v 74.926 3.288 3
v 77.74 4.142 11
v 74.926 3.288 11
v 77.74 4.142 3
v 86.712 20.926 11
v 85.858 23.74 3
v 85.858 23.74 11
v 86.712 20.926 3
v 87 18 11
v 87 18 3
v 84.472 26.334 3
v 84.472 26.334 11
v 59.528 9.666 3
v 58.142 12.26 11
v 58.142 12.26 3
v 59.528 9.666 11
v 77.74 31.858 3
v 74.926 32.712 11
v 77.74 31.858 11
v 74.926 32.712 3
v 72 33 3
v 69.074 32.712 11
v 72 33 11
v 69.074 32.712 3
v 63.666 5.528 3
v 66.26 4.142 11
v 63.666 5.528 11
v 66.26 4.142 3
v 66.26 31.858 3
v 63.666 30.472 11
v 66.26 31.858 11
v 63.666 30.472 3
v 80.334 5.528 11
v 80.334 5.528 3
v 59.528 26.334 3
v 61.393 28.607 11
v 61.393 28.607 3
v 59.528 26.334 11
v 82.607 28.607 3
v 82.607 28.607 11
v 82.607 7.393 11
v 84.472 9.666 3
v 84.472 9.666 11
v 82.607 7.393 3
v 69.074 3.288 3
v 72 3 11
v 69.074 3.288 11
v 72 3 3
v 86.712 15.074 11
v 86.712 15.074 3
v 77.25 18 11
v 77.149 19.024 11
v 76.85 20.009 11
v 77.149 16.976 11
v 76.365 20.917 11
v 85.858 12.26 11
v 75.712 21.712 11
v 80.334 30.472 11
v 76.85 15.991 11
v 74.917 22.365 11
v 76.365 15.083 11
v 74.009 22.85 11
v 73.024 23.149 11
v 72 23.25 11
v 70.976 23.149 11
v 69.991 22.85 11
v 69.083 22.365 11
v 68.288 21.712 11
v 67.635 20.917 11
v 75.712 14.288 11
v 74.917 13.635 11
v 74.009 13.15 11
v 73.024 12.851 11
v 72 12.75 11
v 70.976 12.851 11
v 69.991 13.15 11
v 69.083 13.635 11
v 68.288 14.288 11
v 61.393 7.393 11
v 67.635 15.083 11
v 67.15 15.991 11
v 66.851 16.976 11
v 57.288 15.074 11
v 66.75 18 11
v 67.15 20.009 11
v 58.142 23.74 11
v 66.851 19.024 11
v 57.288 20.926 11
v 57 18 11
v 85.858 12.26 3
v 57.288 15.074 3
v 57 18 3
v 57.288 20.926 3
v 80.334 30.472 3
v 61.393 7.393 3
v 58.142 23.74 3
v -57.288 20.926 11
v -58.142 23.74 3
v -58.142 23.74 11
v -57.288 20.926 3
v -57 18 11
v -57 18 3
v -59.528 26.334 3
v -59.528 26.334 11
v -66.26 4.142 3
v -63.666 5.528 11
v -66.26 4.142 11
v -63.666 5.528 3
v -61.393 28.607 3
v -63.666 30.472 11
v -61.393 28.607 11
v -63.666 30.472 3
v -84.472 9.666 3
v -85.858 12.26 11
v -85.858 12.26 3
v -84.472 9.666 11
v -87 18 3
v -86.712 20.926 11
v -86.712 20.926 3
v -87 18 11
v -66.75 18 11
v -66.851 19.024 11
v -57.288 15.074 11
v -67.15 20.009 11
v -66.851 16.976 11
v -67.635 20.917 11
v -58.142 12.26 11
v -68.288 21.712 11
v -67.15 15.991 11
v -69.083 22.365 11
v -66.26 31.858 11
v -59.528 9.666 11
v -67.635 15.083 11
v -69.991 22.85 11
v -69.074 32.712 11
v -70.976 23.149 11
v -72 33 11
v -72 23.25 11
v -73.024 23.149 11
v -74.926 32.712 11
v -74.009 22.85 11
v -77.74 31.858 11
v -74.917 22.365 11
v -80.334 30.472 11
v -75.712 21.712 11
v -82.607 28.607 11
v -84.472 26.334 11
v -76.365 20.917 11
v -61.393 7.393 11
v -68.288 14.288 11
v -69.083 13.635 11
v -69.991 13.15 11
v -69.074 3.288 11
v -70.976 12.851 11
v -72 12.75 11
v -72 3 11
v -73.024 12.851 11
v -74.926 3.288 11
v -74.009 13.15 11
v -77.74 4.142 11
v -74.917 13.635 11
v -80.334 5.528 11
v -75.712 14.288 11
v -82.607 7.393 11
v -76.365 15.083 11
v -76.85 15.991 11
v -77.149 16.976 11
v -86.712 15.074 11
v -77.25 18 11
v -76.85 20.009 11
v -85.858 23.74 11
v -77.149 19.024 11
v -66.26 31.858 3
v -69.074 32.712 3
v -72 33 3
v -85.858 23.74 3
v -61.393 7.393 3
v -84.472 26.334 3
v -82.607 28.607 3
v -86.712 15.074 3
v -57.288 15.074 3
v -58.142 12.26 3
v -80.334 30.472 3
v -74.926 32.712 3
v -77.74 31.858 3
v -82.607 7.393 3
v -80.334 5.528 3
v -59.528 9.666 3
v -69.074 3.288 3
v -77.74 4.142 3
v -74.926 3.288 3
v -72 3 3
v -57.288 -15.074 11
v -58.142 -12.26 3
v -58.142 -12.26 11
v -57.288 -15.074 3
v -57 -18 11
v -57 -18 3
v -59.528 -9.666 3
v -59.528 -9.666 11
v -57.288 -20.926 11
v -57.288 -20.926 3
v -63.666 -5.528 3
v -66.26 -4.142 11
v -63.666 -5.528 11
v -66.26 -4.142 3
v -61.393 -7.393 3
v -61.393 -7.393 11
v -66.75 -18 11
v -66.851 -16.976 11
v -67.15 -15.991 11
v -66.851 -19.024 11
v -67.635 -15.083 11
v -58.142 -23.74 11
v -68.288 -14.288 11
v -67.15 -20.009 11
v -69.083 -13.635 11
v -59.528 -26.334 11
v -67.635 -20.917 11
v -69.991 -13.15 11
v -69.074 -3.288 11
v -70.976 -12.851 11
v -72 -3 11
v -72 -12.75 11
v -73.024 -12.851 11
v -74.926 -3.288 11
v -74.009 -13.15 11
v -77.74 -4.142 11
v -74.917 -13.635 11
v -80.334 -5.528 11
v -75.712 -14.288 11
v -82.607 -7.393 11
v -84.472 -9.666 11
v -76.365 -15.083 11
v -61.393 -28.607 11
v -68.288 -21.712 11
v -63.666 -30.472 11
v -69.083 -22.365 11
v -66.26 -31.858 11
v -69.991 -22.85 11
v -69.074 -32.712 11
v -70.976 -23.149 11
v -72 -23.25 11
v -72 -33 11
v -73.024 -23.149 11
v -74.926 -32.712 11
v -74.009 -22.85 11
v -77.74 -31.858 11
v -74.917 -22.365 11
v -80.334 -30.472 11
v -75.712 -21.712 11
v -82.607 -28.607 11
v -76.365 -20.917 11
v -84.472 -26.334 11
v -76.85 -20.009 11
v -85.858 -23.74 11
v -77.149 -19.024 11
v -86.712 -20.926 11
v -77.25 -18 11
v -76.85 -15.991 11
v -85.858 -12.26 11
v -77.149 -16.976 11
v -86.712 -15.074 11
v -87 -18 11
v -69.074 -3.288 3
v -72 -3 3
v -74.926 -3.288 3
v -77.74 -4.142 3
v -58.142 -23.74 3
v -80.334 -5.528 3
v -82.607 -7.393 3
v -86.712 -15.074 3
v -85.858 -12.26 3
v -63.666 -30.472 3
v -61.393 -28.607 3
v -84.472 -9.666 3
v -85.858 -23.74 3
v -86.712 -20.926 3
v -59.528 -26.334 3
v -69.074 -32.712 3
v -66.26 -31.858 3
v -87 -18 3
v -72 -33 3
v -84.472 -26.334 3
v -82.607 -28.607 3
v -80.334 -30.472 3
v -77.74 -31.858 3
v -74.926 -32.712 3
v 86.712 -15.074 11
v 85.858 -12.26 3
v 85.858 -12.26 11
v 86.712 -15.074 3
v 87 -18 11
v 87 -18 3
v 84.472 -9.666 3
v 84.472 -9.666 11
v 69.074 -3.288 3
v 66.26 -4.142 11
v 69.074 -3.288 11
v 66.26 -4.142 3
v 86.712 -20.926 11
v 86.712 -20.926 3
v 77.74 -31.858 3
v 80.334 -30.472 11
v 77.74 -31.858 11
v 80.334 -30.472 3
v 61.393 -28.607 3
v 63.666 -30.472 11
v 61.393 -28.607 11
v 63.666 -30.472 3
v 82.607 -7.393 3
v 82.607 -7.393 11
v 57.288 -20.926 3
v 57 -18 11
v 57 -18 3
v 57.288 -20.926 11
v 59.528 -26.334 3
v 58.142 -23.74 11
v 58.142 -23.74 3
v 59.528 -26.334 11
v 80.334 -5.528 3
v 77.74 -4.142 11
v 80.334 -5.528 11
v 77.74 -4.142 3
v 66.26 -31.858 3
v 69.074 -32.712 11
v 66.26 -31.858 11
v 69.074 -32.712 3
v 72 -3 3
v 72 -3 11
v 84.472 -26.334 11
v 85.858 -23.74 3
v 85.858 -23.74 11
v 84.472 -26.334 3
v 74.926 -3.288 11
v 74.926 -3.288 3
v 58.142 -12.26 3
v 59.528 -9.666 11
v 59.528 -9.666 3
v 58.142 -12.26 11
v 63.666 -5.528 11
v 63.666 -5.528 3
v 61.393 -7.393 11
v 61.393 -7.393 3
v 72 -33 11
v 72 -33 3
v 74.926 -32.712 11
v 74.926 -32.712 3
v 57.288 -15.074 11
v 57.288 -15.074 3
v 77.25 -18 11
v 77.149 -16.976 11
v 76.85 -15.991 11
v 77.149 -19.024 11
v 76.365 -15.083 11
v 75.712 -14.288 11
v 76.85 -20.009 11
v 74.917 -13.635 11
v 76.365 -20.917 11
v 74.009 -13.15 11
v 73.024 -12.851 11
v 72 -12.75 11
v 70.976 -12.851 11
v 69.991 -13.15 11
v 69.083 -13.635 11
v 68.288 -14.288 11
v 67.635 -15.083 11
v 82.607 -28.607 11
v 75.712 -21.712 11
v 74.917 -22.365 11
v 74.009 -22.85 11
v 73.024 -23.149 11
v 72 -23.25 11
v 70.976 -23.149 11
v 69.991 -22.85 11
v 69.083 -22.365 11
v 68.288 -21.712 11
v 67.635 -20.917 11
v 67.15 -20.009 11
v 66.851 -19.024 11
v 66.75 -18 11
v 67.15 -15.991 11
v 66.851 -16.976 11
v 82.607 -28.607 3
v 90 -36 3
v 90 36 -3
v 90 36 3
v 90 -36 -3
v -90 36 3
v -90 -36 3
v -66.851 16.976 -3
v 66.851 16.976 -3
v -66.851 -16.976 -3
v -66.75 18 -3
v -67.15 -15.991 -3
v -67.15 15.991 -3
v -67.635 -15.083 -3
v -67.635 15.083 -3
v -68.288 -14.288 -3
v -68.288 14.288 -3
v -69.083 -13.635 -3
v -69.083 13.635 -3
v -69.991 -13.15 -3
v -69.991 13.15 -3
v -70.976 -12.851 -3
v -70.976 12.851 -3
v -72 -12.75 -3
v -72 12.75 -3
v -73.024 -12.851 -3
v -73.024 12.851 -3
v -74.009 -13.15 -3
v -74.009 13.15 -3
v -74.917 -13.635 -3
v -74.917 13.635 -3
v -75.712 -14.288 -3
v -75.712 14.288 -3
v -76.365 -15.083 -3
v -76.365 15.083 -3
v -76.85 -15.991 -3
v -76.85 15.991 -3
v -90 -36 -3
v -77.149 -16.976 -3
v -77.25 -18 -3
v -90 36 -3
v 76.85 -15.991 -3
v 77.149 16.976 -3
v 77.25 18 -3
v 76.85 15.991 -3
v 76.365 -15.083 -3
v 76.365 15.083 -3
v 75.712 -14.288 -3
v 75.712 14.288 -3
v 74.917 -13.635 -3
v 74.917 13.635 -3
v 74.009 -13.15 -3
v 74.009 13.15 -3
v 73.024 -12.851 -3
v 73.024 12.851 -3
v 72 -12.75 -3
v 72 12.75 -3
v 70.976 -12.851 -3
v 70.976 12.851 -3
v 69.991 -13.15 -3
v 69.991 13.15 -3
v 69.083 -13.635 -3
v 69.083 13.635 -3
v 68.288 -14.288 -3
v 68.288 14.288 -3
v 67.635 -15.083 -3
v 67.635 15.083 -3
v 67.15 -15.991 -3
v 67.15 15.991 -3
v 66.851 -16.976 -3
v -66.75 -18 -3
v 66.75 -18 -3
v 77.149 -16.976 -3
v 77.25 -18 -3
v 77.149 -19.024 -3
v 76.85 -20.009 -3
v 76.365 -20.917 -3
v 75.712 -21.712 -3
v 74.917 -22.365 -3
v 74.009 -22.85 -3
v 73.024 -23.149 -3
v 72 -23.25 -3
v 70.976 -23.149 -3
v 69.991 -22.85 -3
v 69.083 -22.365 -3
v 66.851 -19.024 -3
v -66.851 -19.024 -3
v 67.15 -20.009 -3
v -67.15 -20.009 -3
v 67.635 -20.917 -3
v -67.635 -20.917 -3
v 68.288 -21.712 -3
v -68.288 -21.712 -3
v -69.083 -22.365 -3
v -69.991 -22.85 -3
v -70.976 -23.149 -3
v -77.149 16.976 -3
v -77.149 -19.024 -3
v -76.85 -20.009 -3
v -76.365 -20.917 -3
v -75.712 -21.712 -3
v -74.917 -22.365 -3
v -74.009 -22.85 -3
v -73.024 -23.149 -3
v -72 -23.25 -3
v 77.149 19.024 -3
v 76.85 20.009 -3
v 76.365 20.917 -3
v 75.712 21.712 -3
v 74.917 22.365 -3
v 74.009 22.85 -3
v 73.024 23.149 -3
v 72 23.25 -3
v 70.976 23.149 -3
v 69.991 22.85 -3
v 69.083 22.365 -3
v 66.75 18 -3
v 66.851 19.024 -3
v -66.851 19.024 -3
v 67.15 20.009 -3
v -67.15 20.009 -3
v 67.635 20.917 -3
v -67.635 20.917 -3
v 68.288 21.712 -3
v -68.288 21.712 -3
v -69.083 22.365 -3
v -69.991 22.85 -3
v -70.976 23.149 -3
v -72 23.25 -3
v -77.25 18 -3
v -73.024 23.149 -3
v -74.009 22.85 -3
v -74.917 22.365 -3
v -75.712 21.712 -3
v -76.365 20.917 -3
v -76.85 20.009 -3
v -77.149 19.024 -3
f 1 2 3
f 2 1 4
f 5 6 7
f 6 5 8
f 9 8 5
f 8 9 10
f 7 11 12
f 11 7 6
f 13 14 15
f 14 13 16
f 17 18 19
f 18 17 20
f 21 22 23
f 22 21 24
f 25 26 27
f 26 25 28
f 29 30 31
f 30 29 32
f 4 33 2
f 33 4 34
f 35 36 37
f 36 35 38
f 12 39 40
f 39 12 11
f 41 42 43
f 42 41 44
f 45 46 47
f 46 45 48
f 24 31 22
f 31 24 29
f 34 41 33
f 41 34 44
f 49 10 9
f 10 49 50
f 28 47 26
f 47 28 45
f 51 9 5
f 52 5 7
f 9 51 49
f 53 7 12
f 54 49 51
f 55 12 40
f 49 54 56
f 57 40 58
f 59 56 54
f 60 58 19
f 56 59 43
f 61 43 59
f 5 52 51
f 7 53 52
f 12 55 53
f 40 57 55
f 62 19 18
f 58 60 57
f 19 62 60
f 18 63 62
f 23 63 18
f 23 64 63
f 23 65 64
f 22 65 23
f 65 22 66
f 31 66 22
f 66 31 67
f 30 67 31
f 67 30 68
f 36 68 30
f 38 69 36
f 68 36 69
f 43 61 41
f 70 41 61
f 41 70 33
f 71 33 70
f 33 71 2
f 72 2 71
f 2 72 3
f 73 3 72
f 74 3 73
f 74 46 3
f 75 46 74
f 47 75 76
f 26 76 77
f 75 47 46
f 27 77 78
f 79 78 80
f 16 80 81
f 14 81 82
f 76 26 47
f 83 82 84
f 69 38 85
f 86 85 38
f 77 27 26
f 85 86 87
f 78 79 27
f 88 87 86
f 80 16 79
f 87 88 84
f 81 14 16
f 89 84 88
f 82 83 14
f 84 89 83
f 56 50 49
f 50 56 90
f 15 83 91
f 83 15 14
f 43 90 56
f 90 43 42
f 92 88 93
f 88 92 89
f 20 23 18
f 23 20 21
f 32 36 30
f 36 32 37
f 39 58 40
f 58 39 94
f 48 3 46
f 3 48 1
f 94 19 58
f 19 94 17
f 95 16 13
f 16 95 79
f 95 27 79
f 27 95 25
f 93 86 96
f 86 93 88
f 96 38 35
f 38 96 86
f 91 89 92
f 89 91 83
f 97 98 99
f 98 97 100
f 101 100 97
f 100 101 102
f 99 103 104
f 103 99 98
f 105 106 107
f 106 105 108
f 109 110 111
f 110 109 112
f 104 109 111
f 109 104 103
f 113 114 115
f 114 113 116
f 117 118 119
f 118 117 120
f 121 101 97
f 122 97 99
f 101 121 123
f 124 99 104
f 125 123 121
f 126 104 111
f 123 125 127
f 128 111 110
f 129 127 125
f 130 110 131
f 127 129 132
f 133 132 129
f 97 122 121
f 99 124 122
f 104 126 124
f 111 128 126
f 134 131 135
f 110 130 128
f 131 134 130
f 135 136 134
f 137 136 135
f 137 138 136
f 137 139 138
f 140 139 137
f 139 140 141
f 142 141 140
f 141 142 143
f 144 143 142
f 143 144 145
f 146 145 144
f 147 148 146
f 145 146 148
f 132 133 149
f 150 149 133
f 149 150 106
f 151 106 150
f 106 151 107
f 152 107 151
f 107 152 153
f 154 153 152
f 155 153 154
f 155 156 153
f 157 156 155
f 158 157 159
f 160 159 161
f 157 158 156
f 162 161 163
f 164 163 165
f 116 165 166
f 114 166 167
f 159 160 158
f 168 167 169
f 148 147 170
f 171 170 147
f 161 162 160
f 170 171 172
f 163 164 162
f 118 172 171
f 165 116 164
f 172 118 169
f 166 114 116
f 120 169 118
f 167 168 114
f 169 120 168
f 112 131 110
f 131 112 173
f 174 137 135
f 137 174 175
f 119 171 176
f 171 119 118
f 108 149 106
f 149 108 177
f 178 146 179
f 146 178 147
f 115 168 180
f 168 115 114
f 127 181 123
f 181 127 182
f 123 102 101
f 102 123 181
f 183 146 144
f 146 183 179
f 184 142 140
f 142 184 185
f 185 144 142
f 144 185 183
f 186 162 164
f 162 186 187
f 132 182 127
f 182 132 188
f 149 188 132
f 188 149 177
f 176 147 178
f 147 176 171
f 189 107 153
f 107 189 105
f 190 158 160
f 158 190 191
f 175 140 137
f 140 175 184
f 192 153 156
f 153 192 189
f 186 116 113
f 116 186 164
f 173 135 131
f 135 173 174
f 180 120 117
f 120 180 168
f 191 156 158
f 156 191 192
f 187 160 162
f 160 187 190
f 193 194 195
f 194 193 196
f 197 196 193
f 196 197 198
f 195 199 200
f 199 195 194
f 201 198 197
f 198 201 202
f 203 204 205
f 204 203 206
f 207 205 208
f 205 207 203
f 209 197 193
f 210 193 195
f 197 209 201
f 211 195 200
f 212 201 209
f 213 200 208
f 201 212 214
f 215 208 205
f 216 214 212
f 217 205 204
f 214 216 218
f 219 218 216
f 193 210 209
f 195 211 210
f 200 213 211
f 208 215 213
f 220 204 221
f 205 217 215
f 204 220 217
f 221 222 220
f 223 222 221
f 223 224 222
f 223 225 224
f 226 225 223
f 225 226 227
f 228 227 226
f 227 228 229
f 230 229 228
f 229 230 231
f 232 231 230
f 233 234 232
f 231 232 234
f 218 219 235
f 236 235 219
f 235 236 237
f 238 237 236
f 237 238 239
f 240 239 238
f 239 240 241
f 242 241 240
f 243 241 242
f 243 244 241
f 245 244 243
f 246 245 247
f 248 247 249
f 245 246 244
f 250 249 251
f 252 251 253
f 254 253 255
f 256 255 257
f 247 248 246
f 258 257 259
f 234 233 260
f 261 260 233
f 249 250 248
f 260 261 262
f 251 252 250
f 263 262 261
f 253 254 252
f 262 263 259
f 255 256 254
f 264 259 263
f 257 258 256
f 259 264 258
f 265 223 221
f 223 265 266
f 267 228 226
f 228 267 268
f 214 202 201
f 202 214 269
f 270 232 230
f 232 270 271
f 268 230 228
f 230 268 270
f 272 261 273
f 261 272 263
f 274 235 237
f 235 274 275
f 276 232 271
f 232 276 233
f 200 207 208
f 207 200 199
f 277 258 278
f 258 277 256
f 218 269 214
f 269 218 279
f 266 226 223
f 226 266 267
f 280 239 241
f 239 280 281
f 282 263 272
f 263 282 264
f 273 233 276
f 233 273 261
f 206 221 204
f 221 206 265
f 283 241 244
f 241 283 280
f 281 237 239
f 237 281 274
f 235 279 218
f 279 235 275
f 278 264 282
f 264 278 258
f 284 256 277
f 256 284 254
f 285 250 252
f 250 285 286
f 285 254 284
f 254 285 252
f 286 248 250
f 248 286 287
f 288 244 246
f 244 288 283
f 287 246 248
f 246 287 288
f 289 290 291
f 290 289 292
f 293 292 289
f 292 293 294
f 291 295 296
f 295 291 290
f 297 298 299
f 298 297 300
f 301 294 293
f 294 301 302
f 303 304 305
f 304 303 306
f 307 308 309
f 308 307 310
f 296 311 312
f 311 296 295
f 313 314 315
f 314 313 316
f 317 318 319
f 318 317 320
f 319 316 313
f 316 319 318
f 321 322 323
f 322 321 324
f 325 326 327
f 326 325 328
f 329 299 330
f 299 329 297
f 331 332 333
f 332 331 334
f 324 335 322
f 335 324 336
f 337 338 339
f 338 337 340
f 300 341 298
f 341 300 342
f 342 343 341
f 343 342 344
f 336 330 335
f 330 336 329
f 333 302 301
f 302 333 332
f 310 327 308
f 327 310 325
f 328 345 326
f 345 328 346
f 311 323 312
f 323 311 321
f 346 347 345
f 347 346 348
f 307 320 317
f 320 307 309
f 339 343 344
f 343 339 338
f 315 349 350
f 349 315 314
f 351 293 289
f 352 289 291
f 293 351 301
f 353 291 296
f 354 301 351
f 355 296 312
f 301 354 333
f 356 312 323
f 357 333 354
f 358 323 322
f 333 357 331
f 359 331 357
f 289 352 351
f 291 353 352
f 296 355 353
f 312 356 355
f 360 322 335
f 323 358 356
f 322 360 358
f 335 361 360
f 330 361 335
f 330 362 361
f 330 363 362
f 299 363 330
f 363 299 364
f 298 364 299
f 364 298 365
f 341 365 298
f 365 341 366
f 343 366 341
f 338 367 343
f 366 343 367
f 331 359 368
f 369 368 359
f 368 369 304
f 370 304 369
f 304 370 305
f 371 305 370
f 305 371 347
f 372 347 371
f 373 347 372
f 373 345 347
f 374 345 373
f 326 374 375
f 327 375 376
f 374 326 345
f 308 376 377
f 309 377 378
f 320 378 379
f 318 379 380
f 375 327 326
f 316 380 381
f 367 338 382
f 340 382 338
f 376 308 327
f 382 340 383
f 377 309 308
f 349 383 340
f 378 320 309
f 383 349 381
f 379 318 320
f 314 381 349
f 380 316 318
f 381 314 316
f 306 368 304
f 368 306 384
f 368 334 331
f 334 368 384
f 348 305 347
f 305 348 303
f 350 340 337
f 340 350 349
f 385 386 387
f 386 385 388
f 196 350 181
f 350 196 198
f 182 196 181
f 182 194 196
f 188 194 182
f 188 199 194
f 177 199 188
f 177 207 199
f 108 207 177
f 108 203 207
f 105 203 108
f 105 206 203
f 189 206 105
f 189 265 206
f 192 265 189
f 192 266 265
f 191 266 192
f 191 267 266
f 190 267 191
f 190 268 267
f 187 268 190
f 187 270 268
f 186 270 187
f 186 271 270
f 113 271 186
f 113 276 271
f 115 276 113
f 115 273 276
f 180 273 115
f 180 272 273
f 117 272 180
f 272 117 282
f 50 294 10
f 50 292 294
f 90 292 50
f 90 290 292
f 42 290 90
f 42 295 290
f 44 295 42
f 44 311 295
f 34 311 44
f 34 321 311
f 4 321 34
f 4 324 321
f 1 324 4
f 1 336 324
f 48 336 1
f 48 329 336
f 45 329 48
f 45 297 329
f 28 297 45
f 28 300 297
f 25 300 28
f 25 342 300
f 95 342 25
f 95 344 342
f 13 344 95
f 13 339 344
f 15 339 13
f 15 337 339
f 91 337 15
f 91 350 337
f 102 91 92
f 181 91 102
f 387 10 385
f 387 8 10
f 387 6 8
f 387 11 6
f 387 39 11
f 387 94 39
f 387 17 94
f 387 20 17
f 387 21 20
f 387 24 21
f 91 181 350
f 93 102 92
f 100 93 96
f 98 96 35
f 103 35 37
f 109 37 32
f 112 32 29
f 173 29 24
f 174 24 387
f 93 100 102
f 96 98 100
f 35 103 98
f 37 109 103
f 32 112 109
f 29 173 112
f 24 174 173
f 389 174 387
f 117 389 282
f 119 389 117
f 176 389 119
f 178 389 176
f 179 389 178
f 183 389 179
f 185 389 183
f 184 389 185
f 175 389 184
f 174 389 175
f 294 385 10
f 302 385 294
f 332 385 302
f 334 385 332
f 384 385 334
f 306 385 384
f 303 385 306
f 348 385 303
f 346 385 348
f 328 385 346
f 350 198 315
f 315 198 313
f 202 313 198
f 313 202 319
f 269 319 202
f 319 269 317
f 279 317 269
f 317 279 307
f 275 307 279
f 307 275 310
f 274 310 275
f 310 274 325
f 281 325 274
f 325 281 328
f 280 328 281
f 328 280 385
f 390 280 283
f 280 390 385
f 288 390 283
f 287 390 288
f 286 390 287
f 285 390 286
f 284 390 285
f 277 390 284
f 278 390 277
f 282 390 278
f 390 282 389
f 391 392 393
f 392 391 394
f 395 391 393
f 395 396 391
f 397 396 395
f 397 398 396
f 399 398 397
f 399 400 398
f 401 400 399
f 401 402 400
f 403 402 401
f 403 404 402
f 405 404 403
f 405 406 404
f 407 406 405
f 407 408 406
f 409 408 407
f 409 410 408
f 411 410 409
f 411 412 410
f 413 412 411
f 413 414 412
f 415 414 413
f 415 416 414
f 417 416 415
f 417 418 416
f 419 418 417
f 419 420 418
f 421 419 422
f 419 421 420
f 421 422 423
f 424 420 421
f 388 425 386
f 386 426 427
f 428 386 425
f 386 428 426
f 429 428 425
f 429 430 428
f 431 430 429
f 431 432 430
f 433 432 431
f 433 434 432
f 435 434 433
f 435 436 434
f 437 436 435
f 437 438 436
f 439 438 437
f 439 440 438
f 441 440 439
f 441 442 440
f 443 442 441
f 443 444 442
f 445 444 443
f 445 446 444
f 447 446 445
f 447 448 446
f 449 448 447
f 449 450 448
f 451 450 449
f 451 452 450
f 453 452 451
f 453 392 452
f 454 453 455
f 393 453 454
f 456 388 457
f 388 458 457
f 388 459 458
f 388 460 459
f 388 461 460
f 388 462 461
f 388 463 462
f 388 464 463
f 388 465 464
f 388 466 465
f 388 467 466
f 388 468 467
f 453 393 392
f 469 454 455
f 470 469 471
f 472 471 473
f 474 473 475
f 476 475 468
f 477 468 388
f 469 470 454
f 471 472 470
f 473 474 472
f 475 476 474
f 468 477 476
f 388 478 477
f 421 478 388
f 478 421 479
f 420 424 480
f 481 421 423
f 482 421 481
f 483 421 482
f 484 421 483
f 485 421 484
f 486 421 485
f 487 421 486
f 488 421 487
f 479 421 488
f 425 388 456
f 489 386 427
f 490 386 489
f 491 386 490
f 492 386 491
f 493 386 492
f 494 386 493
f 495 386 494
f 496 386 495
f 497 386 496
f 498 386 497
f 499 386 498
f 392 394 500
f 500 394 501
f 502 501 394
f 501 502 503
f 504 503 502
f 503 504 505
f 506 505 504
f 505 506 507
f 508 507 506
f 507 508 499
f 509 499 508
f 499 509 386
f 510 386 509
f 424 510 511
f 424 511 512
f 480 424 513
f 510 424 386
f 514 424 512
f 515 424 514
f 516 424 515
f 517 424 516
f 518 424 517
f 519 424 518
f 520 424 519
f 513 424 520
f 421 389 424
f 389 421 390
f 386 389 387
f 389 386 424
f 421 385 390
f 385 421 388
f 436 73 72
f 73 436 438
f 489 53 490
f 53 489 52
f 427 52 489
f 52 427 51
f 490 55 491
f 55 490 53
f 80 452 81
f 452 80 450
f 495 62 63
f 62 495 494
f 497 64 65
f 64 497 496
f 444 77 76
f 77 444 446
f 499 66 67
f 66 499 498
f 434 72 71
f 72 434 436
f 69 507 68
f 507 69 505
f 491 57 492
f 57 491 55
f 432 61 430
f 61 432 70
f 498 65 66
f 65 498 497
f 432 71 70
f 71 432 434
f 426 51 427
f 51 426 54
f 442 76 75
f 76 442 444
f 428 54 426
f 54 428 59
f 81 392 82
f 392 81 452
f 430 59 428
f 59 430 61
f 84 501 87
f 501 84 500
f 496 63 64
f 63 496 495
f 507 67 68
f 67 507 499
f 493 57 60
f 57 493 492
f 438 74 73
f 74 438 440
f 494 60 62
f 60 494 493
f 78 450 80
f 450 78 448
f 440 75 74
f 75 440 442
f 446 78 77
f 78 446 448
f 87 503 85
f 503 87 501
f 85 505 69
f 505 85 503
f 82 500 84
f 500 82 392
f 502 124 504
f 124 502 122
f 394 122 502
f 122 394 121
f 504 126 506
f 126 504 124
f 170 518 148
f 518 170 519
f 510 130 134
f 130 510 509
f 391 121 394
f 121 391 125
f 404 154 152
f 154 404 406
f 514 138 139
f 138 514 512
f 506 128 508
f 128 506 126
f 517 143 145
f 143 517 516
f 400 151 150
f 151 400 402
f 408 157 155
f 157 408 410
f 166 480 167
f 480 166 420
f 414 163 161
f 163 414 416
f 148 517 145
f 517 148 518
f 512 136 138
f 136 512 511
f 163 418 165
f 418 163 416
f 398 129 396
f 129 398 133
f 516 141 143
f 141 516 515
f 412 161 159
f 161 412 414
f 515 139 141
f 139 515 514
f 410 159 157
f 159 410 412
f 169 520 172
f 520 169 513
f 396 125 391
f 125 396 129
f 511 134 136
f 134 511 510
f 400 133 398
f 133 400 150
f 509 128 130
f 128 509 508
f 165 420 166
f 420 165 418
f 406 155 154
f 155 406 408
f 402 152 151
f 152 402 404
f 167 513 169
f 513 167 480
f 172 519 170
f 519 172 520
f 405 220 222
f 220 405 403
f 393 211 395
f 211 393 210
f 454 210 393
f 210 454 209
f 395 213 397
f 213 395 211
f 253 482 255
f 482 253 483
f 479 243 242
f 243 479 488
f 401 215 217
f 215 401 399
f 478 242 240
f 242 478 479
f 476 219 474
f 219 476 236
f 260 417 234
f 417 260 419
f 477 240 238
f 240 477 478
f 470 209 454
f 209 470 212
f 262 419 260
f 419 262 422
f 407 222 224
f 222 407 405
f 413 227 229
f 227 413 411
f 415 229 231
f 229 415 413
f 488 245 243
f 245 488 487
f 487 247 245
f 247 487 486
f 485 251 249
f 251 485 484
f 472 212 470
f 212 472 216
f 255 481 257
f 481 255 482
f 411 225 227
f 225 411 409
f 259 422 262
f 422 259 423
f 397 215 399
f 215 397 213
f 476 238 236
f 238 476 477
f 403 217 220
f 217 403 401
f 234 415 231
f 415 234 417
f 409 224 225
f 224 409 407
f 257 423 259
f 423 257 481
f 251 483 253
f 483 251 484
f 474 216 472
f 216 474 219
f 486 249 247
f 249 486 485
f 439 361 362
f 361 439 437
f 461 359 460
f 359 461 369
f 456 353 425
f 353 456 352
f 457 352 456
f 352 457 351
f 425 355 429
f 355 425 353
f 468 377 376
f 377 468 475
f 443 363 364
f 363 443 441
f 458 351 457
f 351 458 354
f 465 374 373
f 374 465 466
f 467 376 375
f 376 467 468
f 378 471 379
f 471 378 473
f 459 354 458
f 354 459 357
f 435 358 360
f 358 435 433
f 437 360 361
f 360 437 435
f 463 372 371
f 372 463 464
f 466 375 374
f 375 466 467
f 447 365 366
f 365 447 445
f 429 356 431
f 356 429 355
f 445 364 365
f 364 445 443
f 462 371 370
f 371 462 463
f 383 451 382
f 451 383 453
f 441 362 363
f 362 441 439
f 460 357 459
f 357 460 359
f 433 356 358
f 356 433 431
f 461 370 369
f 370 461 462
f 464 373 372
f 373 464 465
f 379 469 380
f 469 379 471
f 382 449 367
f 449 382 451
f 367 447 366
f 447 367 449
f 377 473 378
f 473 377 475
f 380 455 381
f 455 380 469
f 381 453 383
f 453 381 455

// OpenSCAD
$fn = 32;

// ----------------------------------------------------------------------
// Anchor pads 180 x 72 x 14
// four corner bosses with anchor holes
// ----------------------------------------------------------------------

// --- parameters (mm) ---
plate = [180, 72, 6];  // base plate size (x, y, z)
pads = 4;              // boss count, one per corner
edge = 18;             // boss centre offset from the plate edge
boss_d = 30;           // boss diameter
boss_h = 8;            // boss height above the base plate
hole_d = 10.5;         // hole diameter

// --- derived feature positions (mm) ---
height = plate[2] + boss_h;      // = 14   overall height of the part
corner_x = plate[0] / 2 - edge;  // = 72   boss centre X
corner_y = plate[1] / 2 - edge;  // = 18   boss centre Y
feature_centers = [
  [corner_x, corner_y],
  [-corner_x, corner_y],
  [-corner_x, -corner_y],
  [corner_x, -corner_y]
];   // boss centres, anchor holes are drilled there

// base plate, four bosses standing on it, anchor holes all the way through
difference() {
  union() {
    cube(plate, center = true);
    for (centre = feature_centers)
      translate([centre[0], centre[1], plate[2] / 2 - 1])
        cylinder(d = boss_d, h = boss_h + 1);
  }
  for (centre = feature_centers)
    translate([centre[0], centre[1], -height])
      cylinder(d = hole_d, h = 2 * height + 2);  // through boss and plate
}
